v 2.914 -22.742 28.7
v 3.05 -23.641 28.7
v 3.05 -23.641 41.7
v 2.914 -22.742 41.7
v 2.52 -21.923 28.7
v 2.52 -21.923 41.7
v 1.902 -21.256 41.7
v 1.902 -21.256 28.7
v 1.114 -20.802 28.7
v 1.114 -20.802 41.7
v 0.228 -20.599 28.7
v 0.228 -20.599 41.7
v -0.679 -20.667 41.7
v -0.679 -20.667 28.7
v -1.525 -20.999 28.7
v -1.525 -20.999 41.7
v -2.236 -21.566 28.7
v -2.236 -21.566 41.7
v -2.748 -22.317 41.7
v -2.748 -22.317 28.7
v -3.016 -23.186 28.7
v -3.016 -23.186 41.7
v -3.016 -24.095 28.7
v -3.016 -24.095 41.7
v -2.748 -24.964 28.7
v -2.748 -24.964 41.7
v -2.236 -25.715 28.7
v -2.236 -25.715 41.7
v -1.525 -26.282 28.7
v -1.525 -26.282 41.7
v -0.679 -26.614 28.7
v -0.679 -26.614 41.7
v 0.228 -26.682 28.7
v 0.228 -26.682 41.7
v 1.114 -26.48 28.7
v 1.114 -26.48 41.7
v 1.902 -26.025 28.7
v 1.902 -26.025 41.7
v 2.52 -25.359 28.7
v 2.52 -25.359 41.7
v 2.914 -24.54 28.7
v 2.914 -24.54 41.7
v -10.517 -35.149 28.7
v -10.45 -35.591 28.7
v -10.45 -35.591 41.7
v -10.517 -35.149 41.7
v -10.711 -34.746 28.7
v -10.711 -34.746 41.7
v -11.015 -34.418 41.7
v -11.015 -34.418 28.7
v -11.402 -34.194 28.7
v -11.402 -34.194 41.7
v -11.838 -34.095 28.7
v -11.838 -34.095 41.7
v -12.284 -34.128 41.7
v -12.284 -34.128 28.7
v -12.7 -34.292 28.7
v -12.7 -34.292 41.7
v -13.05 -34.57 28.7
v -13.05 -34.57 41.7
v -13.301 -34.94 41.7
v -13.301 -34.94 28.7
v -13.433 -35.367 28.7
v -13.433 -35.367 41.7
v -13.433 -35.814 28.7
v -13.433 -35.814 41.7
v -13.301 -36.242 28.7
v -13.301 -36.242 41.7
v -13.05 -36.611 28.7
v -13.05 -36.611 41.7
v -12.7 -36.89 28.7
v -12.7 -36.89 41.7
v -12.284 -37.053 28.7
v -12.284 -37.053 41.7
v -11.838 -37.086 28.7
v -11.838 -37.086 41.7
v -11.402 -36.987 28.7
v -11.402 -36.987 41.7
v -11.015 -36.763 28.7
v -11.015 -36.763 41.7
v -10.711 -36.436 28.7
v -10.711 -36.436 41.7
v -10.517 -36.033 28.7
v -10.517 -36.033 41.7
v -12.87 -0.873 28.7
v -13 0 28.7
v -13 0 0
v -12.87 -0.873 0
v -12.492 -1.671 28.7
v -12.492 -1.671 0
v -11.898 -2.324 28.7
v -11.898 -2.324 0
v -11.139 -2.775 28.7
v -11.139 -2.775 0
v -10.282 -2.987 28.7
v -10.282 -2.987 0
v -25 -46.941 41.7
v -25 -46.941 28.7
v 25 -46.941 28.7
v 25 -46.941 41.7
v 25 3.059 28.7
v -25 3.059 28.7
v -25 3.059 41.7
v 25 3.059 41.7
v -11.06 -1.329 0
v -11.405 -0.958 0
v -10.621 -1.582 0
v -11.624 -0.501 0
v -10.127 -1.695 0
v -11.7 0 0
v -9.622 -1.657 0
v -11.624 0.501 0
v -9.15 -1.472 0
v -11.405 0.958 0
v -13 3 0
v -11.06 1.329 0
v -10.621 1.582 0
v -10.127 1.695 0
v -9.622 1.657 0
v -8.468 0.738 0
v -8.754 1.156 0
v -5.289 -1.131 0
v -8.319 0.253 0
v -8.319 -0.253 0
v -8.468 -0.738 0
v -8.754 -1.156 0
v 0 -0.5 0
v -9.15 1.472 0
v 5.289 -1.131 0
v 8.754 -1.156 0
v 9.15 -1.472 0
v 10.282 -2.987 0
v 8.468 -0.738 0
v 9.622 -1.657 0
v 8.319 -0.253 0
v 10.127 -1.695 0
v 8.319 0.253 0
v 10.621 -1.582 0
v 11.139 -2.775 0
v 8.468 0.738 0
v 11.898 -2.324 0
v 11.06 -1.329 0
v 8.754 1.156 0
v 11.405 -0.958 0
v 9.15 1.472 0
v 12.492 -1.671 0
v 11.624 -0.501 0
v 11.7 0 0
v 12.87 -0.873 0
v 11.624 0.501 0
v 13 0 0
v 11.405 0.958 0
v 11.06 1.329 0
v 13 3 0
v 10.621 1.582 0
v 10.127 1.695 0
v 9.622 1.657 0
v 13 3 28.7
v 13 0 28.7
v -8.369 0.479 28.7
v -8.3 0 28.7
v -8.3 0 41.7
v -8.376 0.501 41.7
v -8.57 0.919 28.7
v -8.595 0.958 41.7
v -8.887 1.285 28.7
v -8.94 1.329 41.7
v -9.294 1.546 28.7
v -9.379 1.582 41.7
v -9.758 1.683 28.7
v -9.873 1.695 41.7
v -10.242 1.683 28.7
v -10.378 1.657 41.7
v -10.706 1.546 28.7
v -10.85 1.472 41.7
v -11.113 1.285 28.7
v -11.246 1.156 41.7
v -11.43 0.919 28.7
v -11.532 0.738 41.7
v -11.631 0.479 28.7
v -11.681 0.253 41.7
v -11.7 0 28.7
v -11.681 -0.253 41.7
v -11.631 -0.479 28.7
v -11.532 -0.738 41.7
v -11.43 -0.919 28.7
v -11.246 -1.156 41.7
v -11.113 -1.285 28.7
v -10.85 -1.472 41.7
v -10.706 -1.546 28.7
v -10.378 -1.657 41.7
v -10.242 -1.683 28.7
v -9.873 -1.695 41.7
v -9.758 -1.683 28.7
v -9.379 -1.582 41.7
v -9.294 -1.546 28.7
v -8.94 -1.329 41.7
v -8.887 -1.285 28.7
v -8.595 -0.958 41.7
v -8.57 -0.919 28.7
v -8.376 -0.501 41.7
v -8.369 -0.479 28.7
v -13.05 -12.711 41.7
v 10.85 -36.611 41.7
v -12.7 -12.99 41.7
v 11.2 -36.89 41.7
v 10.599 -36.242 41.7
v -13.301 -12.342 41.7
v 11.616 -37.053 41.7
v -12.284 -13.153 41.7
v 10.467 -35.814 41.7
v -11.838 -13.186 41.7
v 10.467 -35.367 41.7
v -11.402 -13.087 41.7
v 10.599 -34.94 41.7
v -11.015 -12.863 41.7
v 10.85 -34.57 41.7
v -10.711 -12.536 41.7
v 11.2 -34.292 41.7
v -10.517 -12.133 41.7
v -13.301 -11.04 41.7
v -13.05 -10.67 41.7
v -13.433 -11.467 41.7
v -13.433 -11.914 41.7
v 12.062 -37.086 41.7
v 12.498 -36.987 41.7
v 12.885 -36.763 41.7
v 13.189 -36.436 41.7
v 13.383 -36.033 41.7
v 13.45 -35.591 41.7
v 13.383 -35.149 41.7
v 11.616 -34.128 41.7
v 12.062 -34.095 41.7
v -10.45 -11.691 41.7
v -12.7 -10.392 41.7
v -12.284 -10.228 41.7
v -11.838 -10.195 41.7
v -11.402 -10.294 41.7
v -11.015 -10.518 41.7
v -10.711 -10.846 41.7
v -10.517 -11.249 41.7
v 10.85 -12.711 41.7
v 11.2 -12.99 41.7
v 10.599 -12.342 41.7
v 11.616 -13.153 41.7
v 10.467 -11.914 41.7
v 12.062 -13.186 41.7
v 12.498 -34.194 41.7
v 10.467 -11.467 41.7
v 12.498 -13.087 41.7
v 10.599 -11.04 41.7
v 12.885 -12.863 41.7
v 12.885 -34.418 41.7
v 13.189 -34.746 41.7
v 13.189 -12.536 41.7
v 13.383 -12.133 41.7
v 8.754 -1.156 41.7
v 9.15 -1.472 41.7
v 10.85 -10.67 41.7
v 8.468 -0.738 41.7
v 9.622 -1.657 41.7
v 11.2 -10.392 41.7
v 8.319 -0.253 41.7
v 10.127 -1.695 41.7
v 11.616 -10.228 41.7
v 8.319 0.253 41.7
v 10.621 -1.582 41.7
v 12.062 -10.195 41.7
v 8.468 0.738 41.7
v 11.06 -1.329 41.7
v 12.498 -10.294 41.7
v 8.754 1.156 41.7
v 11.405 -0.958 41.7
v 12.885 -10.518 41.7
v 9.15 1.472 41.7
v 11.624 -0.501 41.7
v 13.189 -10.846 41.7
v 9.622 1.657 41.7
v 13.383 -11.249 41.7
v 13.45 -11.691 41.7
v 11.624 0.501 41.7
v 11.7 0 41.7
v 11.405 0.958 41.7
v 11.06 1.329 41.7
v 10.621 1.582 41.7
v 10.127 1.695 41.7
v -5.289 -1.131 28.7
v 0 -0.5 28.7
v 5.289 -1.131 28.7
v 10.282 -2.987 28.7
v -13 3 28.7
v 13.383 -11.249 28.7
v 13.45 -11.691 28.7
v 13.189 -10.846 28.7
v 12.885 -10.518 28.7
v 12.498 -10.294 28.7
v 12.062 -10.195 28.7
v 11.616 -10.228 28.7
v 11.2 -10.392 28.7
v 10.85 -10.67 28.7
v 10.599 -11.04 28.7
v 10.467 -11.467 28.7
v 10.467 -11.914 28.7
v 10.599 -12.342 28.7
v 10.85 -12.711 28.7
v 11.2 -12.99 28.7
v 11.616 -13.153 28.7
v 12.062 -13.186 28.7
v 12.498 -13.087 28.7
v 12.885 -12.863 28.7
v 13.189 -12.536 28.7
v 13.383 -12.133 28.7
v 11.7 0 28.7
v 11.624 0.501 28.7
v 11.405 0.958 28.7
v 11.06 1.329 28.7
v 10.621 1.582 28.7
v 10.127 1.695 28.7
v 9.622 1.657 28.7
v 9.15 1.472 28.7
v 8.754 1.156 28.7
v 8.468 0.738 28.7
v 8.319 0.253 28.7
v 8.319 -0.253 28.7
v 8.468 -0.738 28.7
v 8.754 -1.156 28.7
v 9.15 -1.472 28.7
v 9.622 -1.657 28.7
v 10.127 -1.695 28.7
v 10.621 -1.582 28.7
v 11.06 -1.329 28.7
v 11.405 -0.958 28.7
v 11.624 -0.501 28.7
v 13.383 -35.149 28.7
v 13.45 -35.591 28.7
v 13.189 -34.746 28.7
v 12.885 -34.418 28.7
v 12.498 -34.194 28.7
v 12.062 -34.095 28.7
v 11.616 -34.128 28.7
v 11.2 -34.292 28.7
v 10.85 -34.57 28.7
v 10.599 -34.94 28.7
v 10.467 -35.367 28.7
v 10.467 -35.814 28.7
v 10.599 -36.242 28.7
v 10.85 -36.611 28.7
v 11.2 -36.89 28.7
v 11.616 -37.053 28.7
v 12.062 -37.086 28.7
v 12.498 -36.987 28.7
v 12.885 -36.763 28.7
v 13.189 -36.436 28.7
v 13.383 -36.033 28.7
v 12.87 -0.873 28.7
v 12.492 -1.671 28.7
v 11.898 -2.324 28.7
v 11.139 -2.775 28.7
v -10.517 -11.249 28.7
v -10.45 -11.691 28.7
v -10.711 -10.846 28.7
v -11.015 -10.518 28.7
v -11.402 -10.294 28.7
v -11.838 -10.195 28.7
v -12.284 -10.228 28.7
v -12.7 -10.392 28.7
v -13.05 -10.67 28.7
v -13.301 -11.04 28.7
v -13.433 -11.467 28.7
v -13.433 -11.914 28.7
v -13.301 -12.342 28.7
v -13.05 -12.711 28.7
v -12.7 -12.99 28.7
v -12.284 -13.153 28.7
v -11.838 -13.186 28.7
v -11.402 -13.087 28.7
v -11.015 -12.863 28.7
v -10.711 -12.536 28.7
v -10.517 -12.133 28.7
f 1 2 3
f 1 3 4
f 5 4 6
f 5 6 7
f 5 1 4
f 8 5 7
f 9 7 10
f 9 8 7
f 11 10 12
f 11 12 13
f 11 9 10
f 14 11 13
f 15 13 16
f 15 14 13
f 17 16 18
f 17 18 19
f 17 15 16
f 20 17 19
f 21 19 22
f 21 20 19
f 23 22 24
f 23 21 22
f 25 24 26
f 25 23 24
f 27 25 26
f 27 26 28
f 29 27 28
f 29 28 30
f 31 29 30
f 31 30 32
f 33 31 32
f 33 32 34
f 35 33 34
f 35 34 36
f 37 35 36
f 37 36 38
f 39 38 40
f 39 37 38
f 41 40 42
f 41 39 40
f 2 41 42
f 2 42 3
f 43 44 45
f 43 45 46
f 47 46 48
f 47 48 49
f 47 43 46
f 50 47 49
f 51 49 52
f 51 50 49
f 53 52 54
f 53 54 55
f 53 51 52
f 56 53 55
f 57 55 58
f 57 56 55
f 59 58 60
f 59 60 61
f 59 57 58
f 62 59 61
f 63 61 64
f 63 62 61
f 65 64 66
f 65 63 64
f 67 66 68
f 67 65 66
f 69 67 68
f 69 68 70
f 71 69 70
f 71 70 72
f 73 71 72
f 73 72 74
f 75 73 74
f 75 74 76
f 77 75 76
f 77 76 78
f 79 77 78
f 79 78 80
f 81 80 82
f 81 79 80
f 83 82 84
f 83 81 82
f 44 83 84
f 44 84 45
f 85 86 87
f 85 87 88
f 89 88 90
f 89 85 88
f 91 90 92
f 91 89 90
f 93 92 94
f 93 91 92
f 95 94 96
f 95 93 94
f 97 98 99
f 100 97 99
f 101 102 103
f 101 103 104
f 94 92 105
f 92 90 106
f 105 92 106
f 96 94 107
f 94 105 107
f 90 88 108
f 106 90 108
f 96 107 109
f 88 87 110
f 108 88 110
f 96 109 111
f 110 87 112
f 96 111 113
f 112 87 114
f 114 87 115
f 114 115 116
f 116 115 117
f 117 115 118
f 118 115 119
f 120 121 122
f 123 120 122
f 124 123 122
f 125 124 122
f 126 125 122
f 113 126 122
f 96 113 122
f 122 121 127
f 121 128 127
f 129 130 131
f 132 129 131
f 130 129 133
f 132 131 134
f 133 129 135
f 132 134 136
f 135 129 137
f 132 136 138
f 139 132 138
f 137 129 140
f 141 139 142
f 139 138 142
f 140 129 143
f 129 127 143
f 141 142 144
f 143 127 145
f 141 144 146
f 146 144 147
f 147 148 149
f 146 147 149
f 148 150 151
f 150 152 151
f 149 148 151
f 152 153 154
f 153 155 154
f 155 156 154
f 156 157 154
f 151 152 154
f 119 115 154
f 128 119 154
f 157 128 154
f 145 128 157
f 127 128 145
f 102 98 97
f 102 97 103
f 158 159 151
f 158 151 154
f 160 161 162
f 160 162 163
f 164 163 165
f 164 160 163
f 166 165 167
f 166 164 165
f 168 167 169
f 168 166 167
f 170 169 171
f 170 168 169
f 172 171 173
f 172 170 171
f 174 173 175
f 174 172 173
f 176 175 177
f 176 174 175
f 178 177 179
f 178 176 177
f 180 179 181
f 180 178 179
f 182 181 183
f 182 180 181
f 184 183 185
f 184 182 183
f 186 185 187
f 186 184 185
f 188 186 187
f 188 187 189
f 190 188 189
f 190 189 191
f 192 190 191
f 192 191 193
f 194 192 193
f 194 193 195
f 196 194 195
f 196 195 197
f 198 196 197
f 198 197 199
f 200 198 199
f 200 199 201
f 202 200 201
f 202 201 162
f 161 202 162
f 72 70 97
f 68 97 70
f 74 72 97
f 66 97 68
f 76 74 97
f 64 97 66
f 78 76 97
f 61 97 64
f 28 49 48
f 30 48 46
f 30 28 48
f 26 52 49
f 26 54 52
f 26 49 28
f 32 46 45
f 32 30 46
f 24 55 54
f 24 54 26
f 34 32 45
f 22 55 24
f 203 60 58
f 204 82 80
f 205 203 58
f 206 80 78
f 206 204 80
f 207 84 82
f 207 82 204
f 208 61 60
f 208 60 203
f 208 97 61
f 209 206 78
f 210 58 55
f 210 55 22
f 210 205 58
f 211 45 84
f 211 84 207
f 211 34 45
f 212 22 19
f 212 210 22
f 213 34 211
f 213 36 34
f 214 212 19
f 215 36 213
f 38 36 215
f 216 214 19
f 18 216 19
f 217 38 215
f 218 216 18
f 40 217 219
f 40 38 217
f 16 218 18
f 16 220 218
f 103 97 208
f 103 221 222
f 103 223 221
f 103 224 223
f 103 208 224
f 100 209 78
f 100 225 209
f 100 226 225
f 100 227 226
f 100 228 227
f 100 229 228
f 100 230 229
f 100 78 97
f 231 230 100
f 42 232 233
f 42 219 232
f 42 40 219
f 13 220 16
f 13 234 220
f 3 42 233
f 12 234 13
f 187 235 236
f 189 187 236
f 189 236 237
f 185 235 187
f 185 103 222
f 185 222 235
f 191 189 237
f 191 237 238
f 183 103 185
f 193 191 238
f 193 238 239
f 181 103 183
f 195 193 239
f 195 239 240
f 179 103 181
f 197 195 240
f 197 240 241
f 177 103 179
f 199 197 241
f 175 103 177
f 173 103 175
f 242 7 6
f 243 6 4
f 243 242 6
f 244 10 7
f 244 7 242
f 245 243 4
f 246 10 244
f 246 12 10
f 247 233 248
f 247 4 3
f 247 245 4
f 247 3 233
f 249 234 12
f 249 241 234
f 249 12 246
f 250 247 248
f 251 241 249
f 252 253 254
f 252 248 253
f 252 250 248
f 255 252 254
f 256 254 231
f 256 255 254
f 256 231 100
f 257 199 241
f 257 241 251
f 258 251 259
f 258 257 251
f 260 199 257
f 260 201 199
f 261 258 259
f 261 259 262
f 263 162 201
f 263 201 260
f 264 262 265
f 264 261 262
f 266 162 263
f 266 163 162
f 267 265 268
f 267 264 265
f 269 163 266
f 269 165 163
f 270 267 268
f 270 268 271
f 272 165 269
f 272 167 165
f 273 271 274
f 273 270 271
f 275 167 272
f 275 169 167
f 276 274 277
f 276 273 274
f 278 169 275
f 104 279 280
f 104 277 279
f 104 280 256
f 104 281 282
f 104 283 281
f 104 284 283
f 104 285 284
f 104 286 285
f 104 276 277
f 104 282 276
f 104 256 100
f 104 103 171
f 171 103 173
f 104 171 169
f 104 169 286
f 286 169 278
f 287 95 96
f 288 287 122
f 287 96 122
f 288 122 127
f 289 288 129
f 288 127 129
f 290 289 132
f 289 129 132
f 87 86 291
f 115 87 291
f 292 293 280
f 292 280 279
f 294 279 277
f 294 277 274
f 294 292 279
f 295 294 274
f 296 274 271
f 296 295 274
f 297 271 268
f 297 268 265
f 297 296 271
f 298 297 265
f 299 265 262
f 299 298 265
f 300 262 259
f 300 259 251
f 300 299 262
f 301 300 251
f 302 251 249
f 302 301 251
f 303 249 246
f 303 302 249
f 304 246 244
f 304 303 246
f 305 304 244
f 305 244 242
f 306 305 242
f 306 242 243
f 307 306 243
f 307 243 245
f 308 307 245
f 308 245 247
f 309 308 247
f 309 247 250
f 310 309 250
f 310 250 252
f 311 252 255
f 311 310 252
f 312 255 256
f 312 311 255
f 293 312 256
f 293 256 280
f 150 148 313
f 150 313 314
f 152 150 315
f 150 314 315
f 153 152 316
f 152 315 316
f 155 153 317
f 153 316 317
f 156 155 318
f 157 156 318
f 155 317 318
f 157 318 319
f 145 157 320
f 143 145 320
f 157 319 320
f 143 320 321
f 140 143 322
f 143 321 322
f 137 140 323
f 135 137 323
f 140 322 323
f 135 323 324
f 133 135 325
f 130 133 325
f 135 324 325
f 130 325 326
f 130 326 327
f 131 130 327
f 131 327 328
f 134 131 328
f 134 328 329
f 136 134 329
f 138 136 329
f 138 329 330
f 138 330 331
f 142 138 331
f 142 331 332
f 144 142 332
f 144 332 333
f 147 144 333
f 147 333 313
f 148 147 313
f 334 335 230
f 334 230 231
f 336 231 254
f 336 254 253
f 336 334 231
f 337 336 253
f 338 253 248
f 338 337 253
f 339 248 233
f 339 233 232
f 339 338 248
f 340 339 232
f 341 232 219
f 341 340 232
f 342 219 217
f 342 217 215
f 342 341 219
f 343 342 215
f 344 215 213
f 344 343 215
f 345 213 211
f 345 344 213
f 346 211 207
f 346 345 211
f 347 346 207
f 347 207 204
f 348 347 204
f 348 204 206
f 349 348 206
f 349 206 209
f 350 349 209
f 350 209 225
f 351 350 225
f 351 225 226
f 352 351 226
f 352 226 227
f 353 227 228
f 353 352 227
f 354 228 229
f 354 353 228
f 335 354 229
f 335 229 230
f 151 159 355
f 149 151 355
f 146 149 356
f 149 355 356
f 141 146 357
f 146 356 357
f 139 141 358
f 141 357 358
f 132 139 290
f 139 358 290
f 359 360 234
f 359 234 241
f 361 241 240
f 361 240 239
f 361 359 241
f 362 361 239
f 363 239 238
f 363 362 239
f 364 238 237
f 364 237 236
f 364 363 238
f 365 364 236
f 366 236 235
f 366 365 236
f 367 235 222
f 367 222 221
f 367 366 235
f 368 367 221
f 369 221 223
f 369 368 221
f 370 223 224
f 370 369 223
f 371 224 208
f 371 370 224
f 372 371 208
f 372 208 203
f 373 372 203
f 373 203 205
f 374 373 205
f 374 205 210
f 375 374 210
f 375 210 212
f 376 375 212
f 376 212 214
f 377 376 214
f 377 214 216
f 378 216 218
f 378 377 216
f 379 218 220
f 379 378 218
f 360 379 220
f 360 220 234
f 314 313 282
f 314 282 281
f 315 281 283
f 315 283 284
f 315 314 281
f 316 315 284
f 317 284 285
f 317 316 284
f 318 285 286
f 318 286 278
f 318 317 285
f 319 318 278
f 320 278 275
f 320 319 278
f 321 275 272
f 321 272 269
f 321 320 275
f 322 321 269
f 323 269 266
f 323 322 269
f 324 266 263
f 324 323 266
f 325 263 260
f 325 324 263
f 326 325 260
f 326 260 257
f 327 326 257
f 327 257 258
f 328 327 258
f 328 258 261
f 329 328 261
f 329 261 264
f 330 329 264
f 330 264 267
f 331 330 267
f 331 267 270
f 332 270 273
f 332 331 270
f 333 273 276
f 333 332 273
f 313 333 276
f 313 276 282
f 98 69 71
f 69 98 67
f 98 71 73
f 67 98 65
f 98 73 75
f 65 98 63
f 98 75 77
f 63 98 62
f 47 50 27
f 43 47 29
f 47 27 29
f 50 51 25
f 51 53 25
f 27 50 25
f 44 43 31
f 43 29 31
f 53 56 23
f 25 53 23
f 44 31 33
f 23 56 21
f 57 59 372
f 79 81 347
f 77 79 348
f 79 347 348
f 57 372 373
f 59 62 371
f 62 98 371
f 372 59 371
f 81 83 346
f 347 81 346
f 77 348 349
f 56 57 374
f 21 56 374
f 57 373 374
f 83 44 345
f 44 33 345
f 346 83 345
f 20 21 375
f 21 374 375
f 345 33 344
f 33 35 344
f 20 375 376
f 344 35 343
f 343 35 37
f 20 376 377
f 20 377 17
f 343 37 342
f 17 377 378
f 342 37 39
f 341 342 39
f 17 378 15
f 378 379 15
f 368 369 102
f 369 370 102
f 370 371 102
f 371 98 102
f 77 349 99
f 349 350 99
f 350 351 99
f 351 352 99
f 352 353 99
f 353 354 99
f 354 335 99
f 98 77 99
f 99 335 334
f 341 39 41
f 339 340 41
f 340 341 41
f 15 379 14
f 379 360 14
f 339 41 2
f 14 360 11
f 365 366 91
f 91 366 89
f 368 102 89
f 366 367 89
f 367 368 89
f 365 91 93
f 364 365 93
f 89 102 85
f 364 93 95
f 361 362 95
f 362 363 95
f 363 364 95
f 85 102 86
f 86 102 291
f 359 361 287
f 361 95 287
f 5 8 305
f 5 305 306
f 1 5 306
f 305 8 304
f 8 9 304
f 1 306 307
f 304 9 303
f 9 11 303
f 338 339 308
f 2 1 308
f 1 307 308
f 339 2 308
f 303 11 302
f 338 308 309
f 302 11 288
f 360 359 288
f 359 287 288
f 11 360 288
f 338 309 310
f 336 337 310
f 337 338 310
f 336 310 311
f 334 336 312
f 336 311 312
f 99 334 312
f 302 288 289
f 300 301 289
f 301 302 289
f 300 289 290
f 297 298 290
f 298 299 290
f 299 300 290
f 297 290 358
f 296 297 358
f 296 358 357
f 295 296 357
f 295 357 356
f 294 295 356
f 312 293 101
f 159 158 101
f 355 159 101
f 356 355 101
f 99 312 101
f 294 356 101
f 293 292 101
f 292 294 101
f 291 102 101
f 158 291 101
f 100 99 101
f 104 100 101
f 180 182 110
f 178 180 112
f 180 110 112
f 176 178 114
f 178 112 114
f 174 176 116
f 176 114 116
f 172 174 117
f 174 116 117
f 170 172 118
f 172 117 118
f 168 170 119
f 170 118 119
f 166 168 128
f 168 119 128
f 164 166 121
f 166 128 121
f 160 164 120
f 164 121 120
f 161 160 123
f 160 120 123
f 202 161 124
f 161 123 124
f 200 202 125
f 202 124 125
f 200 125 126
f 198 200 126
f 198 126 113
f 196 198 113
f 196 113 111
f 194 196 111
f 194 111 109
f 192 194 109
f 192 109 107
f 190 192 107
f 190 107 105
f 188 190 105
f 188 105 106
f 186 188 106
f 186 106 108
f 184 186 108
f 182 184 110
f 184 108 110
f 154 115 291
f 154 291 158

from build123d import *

# Parameters (mm, degrees)
SKETCH1_W           = 26
SKETCH1_H           = 6
BOSS_EXTRUDE1_DEPTH = 28.7
SKETCH4_R           = 1.7
CUT_EXTRUDE2_DEPTH  = 9
SKETCH8_R           = 1.7
CUT_EXTRUDE4_DEPTH  = 32.649486568
FILLET2_R           = 3
SKETCH9_R           = 22.5
CUT_EXTRUDE5_DEPTH  = 45
SKETCH_2_W          = 50
SKETCH_2_H          = 50
SKETCH_2_R          = 1.5
SKETCH_2_R_2        = 1.7
EXTRUDE_2_DEPTH     = 13


with BuildPart() as part:
    # Sketch1 → Boss-Extrude1 (new body)
    with BuildSketch(Plane.XY):
        Rectangle(SKETCH1_W, SKETCH1_H)
    extrude(amount=BOSS_EXTRUDE1_DEPTH)

    # Sketch4 → Cut-Extrude2 (cut)
    with BuildSketch(Plane(origin=(0, 0, 0), x_dir=(-1, 0, 0), z_dir=(0, 0, -1))):
        with Locations((-15, 0)):
            Circle(SKETCH4_R)
        with Locations((10, 0)):
            Circle(SKETCH4_R)
    extrude(amount=-CUT_EXTRUDE2_DEPTH, mode=Mode.SUBTRACT)

    # Sketch8 → Cut-Extrude4 (cut, through all)
    with BuildSketch(Plane.XY.offset(28.7)):
        with Locations((-10, 0)):
            Circle(SKETCH8_R)
        with Locations((10, 0)):
            Circle(SKETCH8_R)
    extrude(amount=-CUT_EXTRUDE4_DEPTH, mode=Mode.SUBTRACT)

    # Fillet2
    fillet2_edges = [part.edges().sort_by_distance(p)[0] for p in [
        (13, -3, 14.35),
        (-13, -3, 14.35),
    ]]
    fillet(fillet2_edges, radius=FILLET2_R)

    # Sketch9 → Cut-Extrude5 (cut)
    with BuildSketch(Plane(origin=(0, 0, 0), x_dir=(-1, 0, 0), z_dir=(0, 0, -1))):
        with Locations((0, -23)):
            Circle(SKETCH9_R)
    extrude(amount=-CUT_EXTRUDE5_DEPTH, mode=Mode.SUBTRACT)

    # 草图2 → 凸台-拉伸2 (add)
    with BuildSketch(Plane.XY.offset(28.7)):
        with Locations((0, -21.940687277)):
            Rectangle(SKETCH_2_W, SKETCH_2_H)
        with Locations((-11.95, -35.590687277)):
            Circle(SKETCH_2_R, mode=Mode.SUBTRACT)
        with BuildLine():
            ThreePointArc((3.05, -23.640687277), (0, -26.690687277), (-3.05, -23.640687277))
            ThreePointArc((-3.05, -23.640687277), (0, -20.590687277), (3.05, -23.640687277))
        make_face(mode=Mode.SUBTRACT)
        with Locations((11.95, -35.590687277)):
            Circle(SKETCH_2_R, mode=Mode.SUBTRACT)
        with Locations((-11.95, -11.690687277)):
            Circle(SKETCH_2_R, mode=Mode.SUBTRACT)
        with Locations((11.95, -11.690687277)):
            Circle(SKETCH_2_R, mode=Mode.SUBTRACT)
        with Locations((-10, 0)):
            Circle(SKETCH_2_R_2, mode=Mode.SUBTRACT)
        with Locations((10, 0)):
            Circle(SKETCH_2_R_2, mode=Mode.SUBTRACT)
    extrude(amount=EXTRUDE_2_DEPTH)


solid = part.part
